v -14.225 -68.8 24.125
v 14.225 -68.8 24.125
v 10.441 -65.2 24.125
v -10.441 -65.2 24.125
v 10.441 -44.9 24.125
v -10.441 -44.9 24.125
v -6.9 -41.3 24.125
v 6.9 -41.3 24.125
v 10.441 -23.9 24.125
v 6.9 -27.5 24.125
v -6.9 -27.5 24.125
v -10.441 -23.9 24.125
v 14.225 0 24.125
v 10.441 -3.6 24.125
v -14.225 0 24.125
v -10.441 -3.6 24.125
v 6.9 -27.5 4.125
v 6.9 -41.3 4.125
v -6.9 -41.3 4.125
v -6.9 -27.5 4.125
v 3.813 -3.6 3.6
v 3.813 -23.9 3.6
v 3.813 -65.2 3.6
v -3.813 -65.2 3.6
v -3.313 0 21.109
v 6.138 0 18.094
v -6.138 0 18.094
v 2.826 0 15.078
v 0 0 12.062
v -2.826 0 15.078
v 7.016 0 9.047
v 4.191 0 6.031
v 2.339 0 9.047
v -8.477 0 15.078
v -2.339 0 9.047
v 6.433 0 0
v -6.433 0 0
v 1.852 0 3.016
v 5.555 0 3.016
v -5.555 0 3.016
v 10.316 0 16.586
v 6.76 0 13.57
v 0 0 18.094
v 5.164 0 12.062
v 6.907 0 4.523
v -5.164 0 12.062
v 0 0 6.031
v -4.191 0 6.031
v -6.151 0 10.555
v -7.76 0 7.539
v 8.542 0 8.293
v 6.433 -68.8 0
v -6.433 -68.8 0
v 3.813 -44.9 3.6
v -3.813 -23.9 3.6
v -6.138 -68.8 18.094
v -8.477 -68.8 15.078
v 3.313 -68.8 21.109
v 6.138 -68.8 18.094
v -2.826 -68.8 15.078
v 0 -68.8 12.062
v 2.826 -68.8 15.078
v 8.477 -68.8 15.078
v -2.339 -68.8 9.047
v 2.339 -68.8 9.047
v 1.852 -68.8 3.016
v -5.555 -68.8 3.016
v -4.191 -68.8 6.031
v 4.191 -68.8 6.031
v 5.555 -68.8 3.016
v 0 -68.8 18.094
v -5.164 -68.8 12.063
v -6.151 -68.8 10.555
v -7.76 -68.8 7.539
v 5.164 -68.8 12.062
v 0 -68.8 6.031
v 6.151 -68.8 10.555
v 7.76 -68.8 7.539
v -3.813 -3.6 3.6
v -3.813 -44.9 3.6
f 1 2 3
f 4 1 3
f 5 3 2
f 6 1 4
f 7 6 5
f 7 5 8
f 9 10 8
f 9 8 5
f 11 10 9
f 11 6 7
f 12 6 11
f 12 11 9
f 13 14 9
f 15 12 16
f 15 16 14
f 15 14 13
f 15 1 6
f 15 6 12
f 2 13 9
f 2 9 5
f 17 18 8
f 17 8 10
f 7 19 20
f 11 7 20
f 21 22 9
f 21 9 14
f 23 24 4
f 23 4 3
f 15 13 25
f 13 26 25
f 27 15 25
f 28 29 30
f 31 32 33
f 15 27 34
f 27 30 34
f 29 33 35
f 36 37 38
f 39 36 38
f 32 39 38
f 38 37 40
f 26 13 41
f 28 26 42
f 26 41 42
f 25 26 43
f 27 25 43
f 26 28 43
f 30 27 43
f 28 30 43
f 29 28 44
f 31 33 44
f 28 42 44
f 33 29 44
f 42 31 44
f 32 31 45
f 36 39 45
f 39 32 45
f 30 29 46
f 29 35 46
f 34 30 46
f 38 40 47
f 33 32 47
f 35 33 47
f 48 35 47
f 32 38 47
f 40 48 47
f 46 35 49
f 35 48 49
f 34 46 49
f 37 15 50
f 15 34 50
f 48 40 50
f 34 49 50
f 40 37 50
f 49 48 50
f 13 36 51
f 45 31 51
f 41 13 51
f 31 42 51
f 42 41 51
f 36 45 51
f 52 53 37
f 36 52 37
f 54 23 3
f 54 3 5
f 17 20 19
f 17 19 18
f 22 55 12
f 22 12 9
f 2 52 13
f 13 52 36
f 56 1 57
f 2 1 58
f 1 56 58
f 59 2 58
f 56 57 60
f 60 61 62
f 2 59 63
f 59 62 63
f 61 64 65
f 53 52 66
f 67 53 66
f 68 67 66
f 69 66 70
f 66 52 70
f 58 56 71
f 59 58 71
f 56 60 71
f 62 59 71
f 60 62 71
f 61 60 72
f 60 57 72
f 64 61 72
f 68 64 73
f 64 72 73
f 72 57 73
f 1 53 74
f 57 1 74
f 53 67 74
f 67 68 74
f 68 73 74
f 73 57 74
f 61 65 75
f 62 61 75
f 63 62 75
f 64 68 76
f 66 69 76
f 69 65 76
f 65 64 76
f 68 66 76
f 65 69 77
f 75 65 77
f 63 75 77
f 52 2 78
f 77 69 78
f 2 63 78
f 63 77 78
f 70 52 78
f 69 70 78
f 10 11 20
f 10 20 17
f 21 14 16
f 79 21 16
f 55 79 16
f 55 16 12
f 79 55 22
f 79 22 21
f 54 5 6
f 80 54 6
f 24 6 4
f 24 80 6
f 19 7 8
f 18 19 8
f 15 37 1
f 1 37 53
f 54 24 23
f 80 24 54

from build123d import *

# Parameters (mm, degrees)
F1_W        = 36.2
F1_H        = 68.8
F2_W        = 12.866667
F2_H        = 68.8
F4_DEPTH    = 12
F5_W        = 13.8
F5_H        = 13.8
F6_DEPTH    = 32
F7_T        = 3.6
F7_T3_DEPTH = 27.2
F7_T5_DEPTH = 21
F7_T7_DEPTH = 21


# Not quite as in the source:
# - a shell that OpenCascade refuses in one call is made with other operations: the cavity is built on its own and cut out


with BuildPart() as f3:
    # F1 (on offset) → F3 section 0
    with BuildSketch(Plane.XY.offset(36.125)):
        with Locations((0, -34.4)):
            Rectangle(F1_W, F1_H)
    # F2 (on Top) → F3 section 1
    with BuildSketch(Plane.XY):
        with Locations((-3.35e-05, -34.4)):
            Rectangle(F2_W, F2_H)
    loft()

    # F4 (cut): a face of the model
    f4_faces = [f3.faces().sort_by_distance(p)[0] for p in [
        (0, -34.4, 36.125),
    ]]
    extrude(f4_faces, amount=-F4_DEPTH, mode=Mode.SUBTRACT)

    # F5 (on offset) → F6 (cut)
    with BuildSketch(Plane.XY.offset(36.125)):
        with Locations((0, -34.4)):
            Rectangle(F5_W, F5_H)
    extrude(amount=-F6_DEPTH, mode=Mode.SUBTRACT)

    # F7: shell of thickness 3.6, made by hand


with BuildPart() as f7_core1:
    # F7_t2: copy of F3
    add(f3.part)

    # the walls: a layer under each face that stays
    f7_faces = [f7_core1.faces().sort_by_distance(p)[0] for p in [
        (-2.2314e-05, 0, 12.0625),
        (10.3289282007, -34.4, 12.0625),
        (-3.35e-05, -34.4, 0),
        (-10.3289728287, -34.4, 12.0625),
        (-2.2314e-05, -68.8, 12.0625),
        (0, -27.5, 14.125),
        (6.9, -34.4, 14.125),
        (0, -41.3, 14.125),
        (-6.9, -34.4, 14.125),
        (0, -34.4, 4.125),
    ]]
    thicken(f7_faces, amount=-F7_T, mode=Mode.SUBTRACT)

    # F7_s4 → F7_t3 (cut)
    with BuildSketch(Plane.XY.offset(0.525)):
        Polygon((-6.864, -27.536), (-6.9, -23.9), (-10.5, -23.9), (-10.5, -27.5), align=None)
        Polygon((6.864, -27.536), (6.9, -23.9), (10.5, -23.9), (10.5, -27.5), align=None)
        Polygon((6.864, -41.264), (10.5, -41.3), (10.5, -44.9), (6.9, -44.9), align=None)
        Polygon((-6.864, -41.264), (-6.9, -44.9), (-10.5, -44.9), (-10.5, -41.3), align=None)
    extrude(amount=F7_T3_DEPTH, mode=Mode.SUBTRACT)

    # F7_s6 → F7_t5 (cut)
    with BuildSketch(Plane.YZ.offset(-10.5)):
        Polygon((-27.536, 4.161), (-23.9, 4.125), (-23.9, 0.525), (-27.5, 0.525), align=None)
        Polygon((-41.264, 4.161), (-44.9, 4.125), (-44.9, 0.525), (-41.3, 0.525), align=None)
    extrude(amount=F7_T5_DEPTH, mode=Mode.SUBTRACT)

    # F7_s8 → F7_t7 (cut)
    with BuildSketch(Plane.XZ.offset(23.9)):
        Polygon((6.864, 4.161), (10.5, 4.125), (10.5, 0.525), (6.9, 0.525), align=None)
        Polygon((-6.864, 4.161), (-10.5, 4.125), (-10.5, 0.525), (-6.9, 0.525), align=None)
    extrude(amount=F7_T7_DEPTH, mode=Mode.SUBTRACT)


with BuildPart() as f3_1:
    add(f3.part)

    # what is left inside the walls is the cavity
    f7_cavity = [f7_core1.part.solids().sort_by_distance(p)[0] for p in [
        (8.197675, -13.75, 17.294397),
        (8.197675, -55.05, 17.294397),
    ]]
    add(f7_cavity, mode=Mode.SUBTRACT)


solid = f3_1.part
